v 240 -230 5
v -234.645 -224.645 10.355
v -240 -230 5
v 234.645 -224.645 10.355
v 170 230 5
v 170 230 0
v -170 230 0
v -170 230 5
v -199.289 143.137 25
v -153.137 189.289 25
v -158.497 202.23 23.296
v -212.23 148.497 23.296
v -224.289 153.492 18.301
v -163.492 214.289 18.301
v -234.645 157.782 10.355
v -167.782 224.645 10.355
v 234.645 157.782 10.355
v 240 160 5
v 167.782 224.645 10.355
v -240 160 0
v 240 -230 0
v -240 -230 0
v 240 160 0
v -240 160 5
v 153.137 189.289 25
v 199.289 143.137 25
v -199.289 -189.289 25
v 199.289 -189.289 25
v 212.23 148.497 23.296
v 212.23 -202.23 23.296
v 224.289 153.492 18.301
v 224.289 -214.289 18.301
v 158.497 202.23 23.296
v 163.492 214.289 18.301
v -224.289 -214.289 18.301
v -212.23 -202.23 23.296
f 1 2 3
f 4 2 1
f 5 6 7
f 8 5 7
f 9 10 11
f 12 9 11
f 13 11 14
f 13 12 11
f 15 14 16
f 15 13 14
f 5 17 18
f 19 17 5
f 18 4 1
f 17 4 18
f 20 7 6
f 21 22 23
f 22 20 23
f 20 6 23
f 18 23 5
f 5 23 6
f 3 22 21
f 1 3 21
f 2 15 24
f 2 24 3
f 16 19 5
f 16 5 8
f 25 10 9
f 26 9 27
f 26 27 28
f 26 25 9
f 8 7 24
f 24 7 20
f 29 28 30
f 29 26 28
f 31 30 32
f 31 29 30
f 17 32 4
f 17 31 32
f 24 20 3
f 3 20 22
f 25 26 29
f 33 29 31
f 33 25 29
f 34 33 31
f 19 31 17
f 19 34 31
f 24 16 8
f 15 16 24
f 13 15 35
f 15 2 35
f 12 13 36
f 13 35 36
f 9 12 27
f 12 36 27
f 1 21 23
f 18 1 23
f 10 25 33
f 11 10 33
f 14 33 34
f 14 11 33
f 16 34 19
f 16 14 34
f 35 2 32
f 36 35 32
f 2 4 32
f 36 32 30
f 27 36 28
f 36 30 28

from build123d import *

# Parameters (mm, degrees)
F1_DEPTH = 25
F2_SIZE  = 20
F3_R     = 50


with BuildPart() as f1:
    # F0 (on Top) → F1 (new body)
    with BuildSketch(Plane.XY):
        Polygon((-240, -230), (240, -230), (240, 160), (170, 230), (-170, 230), (-240, 160), align=None)
    extrude(amount=F1_DEPTH)

    # F2
    f2_edges = [f1.edges().sort_by_distance(p)[0] for p in [
        (205, 195, 25),
        (-205, 195, 25),
        (0, 230, 25),
        (240, -35, 25),
        (-240, -35, 25),
        (0, -230, 25),
    ]]
    chamfer(f2_edges, length=F2_SIZE)

    # F3
    f3_edges = [f1.edges().sort_by_distance(p)[0] for p in [
        (0, 210, 25),
        (190.857864, 180.857864, 25),
        (220, -29.142136, 25),
        (-190.857864, 180.857864, 25),
        (-220, -29.142136, 25),
        (0, -210, 25),
    ]]
    fillet(f3_edges, radius=F3_R)


solid = f1.part
